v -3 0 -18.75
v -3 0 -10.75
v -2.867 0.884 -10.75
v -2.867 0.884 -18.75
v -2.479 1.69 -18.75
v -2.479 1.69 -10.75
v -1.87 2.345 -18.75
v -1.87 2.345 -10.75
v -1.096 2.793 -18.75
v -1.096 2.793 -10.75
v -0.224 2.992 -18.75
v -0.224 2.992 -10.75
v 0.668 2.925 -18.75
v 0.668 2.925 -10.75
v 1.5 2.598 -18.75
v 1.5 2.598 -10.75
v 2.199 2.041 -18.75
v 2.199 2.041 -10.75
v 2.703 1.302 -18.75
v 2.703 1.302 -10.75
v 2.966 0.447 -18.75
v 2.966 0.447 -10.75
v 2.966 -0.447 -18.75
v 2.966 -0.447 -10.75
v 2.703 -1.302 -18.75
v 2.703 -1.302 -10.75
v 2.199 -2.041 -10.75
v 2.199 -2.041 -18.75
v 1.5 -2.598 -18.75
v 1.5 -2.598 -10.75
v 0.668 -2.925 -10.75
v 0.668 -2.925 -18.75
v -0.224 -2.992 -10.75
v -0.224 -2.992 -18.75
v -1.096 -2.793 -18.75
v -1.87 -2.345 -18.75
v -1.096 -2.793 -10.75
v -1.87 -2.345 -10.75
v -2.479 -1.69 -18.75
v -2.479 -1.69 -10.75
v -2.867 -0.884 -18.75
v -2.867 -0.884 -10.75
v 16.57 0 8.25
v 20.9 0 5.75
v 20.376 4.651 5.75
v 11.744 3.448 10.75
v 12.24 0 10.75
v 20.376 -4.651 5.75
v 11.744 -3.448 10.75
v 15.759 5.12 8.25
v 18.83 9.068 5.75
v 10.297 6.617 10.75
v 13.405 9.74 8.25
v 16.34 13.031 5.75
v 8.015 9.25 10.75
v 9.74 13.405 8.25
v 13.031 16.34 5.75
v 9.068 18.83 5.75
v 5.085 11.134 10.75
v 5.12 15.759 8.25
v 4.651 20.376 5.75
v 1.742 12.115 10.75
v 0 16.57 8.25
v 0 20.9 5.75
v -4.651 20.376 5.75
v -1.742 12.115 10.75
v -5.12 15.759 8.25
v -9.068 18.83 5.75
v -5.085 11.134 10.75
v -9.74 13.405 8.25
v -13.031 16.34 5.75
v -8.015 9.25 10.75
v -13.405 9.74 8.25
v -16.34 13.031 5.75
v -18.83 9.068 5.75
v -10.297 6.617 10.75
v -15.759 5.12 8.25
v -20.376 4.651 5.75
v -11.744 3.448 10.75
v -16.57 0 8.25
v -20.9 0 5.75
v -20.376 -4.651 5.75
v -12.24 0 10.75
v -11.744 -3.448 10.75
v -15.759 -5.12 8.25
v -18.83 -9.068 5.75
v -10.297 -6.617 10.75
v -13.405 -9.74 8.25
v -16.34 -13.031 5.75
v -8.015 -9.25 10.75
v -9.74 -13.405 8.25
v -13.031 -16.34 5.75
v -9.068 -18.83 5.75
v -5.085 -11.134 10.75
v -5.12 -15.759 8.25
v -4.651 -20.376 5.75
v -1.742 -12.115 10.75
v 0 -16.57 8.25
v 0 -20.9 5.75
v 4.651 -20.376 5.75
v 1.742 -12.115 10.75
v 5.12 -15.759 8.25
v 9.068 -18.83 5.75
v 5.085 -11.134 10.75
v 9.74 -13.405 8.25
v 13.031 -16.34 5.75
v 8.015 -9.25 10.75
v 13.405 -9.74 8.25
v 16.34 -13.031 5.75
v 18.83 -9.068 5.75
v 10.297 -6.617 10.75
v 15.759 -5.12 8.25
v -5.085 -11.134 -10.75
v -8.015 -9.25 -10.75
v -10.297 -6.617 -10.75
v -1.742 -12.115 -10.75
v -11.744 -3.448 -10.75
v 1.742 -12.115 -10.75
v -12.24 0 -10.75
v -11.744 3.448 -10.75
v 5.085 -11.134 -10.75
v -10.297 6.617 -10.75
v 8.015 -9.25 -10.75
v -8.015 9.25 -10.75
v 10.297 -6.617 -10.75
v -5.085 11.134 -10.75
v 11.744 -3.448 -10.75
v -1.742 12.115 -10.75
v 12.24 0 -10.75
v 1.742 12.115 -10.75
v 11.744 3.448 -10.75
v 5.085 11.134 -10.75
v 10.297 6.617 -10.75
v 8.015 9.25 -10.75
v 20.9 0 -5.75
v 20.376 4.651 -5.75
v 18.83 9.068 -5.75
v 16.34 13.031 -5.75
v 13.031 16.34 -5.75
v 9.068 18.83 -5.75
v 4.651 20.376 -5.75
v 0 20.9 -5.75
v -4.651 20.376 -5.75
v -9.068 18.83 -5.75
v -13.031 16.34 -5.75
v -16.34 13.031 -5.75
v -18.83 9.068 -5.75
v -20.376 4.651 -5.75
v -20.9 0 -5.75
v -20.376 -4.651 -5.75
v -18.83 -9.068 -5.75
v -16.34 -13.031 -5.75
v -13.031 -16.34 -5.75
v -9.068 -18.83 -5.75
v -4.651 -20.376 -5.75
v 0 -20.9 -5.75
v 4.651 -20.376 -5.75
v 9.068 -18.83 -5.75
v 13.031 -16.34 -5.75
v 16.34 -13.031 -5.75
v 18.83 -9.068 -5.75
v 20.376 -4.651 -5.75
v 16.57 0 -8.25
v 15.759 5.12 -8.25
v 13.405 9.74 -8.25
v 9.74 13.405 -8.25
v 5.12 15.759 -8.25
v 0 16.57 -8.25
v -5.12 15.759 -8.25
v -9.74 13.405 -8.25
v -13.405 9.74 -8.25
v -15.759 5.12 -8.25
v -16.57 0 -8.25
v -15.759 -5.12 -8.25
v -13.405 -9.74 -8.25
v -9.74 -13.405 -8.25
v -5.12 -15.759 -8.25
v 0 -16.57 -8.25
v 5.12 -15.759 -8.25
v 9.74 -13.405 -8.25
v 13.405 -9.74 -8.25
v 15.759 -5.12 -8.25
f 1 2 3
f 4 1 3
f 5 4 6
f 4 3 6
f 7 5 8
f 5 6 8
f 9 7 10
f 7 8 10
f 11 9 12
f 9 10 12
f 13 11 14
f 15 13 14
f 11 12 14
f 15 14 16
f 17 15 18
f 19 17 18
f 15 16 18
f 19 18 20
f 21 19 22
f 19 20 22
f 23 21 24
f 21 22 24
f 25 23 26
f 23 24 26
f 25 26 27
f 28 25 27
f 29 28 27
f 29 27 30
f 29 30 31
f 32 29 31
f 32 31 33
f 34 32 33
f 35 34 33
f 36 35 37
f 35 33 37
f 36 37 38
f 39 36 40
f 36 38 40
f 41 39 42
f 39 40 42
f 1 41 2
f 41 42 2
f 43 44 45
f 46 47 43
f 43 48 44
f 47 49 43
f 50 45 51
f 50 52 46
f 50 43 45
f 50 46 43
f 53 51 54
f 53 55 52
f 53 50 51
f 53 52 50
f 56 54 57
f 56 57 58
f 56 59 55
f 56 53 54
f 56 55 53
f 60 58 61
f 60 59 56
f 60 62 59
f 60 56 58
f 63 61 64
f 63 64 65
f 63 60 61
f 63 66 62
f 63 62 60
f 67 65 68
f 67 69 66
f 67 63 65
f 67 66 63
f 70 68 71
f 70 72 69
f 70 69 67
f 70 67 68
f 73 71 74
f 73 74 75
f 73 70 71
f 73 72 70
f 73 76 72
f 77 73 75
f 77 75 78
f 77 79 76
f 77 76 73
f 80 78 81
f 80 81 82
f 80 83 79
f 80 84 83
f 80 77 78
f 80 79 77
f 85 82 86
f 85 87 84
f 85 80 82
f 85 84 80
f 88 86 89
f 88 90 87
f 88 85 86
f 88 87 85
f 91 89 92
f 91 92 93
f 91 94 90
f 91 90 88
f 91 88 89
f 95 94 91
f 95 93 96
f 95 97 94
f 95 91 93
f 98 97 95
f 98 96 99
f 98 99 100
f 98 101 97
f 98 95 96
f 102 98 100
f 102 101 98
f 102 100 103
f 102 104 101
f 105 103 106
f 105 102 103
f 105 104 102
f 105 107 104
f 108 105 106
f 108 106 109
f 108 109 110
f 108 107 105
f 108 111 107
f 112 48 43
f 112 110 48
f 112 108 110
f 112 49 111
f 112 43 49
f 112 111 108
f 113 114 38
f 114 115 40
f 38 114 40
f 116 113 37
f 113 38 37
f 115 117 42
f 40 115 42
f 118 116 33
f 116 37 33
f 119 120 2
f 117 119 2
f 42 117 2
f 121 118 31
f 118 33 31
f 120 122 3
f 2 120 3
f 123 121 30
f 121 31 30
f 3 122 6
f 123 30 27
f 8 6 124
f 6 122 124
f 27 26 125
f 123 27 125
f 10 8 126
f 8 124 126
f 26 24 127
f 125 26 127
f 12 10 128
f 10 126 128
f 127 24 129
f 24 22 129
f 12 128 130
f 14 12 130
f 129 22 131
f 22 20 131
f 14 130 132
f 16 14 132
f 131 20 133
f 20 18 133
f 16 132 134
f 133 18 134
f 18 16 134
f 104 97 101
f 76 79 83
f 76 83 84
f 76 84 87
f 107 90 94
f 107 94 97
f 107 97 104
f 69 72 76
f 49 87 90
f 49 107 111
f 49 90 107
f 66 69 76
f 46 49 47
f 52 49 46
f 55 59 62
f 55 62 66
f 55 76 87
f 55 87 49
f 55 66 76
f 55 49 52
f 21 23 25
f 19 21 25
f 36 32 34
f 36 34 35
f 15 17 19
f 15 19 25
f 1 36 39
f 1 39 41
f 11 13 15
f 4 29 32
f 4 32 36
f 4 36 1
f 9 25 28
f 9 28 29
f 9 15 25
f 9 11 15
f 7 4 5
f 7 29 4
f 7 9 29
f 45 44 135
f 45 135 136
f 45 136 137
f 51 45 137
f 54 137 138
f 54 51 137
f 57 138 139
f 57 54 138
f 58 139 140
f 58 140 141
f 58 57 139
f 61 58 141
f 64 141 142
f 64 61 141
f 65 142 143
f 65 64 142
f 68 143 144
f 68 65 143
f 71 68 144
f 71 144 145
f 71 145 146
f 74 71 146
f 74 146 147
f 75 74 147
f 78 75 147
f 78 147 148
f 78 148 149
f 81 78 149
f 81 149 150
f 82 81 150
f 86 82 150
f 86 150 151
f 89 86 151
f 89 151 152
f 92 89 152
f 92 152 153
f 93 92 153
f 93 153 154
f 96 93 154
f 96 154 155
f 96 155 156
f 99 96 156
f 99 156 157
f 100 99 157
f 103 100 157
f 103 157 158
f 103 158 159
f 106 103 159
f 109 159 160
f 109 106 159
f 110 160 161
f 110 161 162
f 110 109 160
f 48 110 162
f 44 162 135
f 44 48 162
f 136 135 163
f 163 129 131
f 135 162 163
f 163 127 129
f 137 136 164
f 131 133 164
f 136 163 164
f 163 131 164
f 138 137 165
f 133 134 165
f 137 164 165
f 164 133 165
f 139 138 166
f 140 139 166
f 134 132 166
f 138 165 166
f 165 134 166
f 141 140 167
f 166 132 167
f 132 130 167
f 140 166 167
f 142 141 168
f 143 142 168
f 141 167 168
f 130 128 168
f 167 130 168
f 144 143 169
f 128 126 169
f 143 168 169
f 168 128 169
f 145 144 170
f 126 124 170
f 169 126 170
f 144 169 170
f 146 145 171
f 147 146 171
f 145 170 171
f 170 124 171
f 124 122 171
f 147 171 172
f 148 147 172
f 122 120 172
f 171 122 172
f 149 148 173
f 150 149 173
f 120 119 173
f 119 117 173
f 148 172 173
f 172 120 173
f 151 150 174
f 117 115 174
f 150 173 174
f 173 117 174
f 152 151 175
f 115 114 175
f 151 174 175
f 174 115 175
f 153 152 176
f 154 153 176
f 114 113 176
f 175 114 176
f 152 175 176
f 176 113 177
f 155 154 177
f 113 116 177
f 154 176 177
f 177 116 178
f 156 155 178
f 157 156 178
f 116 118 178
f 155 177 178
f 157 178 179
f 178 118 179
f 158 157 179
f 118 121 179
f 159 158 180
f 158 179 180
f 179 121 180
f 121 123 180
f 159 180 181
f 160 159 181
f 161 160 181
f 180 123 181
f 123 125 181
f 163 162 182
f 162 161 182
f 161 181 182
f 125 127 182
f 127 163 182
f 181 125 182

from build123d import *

# Parameters (mm, degrees)
SCHIZZO2_R                   = 20.9
ESTRUSIONE_ESTRUSIONE1_DEPTH = 10.75
SCHIZZO3_R                   = 3
ESTRUSIONE_ESTRUSIONE2_DEPTH = 8
SMUSSO1_SIZE                 = 5
SMUSSO1_SIZE2                = 8.660254038


with BuildPart() as part:
    # Schizzo2 → Estrusione-Estrusione1 (new body, symmetric)
    with BuildSketch(Plane.XY):
        Circle(SCHIZZO2_R)
    extrude(amount=ESTRUSIONE_ESTRUSIONE1_DEPTH, both=True)

    # Schizzo3 → Estrusione-Estrusione2 (add)
    with BuildSketch(Plane(origin=(0, 0, -10.75), x_dir=(-1, 0, 0), z_dir=(0, 0, -1))):
        Circle(SCHIZZO3_R)
    extrude(amount=ESTRUSIONE_ESTRUSIONE2_DEPTH)

    # Smusso1
    smusso1_edges = [part.edges().sort_by_distance(p)[0] for p in [
        (-20.9, 0, -10.75),
        (-20.9, 0, 10.75),
    ]]
    smusso1_side = [part.faces().sort_by_distance(p)[0] for p in [
        (-20.9, 0, 0),
    ]]
    chamfer(smusso1_edges, length=SMUSSO1_SIZE, length2=SMUSSO1_SIZE2, reference=smusso1_side[0])


solid = part.part
